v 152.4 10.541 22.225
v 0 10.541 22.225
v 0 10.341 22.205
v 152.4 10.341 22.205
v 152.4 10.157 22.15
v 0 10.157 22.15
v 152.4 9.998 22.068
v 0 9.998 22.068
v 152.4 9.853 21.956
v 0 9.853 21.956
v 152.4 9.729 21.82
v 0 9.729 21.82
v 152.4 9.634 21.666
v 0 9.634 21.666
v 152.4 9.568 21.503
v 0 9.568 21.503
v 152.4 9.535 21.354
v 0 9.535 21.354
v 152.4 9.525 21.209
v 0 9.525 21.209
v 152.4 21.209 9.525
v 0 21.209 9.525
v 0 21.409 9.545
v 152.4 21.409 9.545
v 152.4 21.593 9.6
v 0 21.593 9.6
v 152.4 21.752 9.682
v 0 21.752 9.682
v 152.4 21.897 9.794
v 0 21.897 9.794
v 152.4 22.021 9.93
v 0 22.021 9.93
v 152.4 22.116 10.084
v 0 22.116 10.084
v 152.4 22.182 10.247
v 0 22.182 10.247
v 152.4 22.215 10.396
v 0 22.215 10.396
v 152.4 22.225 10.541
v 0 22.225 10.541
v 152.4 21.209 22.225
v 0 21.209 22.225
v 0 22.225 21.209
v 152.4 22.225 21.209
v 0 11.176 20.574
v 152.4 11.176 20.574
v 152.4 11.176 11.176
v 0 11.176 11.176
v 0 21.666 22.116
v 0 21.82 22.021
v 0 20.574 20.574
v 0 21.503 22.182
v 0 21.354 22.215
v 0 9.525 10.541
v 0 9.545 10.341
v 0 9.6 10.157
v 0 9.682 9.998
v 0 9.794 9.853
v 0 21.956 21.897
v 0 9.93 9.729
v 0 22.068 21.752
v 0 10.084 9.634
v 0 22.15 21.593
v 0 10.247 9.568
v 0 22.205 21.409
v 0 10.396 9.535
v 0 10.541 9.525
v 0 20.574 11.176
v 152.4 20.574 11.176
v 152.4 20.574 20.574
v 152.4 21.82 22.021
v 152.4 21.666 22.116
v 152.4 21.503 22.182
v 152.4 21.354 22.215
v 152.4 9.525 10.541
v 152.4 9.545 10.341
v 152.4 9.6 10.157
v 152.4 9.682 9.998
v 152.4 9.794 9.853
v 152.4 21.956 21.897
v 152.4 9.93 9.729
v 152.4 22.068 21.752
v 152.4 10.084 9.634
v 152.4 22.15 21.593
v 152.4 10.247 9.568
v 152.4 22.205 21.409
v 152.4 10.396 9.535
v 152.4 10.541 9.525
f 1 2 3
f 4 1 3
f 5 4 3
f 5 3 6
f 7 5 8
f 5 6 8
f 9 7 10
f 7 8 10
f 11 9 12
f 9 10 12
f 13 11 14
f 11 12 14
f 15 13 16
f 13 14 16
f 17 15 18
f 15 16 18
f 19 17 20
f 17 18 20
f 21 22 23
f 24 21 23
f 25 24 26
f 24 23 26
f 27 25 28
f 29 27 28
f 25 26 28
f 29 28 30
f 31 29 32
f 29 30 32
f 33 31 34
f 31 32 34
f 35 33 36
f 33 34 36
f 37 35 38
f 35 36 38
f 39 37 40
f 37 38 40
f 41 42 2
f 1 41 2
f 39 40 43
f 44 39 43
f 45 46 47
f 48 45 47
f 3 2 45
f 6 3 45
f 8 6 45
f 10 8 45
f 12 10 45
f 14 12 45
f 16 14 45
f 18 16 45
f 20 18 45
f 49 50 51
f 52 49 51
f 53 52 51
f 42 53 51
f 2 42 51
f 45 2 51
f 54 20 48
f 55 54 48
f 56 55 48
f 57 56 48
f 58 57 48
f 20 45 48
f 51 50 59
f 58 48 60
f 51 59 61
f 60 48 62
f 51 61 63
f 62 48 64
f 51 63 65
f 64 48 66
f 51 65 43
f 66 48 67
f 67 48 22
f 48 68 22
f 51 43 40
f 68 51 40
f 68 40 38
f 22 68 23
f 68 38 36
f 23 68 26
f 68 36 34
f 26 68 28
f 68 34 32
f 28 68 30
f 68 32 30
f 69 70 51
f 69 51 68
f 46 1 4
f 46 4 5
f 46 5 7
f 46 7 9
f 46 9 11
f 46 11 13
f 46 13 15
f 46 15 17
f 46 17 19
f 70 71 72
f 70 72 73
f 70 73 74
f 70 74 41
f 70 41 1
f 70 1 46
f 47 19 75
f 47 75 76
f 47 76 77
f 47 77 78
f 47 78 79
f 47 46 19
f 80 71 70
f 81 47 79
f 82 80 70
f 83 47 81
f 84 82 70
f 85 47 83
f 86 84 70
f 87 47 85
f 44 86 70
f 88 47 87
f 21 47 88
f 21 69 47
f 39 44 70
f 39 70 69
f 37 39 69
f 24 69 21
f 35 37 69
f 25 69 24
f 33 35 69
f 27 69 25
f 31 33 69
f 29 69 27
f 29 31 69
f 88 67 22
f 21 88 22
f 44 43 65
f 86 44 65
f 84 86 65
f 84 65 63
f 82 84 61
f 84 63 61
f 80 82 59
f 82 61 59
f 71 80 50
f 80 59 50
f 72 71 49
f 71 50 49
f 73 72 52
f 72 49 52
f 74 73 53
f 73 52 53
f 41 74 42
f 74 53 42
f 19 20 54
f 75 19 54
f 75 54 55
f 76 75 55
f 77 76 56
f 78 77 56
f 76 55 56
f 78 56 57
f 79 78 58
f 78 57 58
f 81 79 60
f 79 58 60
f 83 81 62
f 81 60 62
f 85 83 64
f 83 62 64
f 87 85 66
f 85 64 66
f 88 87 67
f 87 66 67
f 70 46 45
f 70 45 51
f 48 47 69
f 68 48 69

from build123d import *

# Parameters (mm, degrees)
SKETCH1_W           = 23.495
SKETCH1_H           = 23.495
BOSS_EXTRUDE1_DEPTH = 152.4
SCALE1_SCALE_X      = 1
SCALE1_SCALE_Y      = 0.4
SCALE1_SCALE_Z      = 0.4


with BuildPart() as part:
    # Sketch1 → Boss-Extrude1 (new body)
    with BuildSketch(Plane(origin=(0, 0, 0), x_dir=(0, 0, -1), z_dir=(1, 0, 0))):
        with BuildLine():
            Line((0, 2.54), (0, 29.21))
            ThreePointArc((0, 29.21), (-0.743948776, 31.006051224), (-2.54, 31.75))
            Line((-2.54, 31.75), (-29.21, 31.75))
            ThreePointArc((-29.21, 31.75), (-31.006051224, 31.006051224), (-31.75, 29.21))
            Line((-31.75, 29.21), (-31.75, 2.54))
            ThreePointArc((-31.75, 2.54), (-31.006051224, 0.743948776), (-29.21, 0))
            Line((-29.21, 0), (-2.54, 0))
            ThreePointArc((-2.54, 0), (-0.743948776, 0.743948776), (0, 2.54))
        make_face()
        with Locations((-15.875, 15.875)):
            Rectangle(SKETCH1_W, SKETCH1_H, mode=Mode.SUBTRACT)
    extrude(amount=BOSS_EXTRUDE1_DEPTH)


with BuildPart() as part_1:
    # Scale1: scaled about (76.2, 15.875, 15.875)
    add(part.part.scale((SCALE1_SCALE_X, SCALE1_SCALE_Y, SCALE1_SCALE_Z), about=(76.2, 15.875, 15.875)))


solid = part_1.part
